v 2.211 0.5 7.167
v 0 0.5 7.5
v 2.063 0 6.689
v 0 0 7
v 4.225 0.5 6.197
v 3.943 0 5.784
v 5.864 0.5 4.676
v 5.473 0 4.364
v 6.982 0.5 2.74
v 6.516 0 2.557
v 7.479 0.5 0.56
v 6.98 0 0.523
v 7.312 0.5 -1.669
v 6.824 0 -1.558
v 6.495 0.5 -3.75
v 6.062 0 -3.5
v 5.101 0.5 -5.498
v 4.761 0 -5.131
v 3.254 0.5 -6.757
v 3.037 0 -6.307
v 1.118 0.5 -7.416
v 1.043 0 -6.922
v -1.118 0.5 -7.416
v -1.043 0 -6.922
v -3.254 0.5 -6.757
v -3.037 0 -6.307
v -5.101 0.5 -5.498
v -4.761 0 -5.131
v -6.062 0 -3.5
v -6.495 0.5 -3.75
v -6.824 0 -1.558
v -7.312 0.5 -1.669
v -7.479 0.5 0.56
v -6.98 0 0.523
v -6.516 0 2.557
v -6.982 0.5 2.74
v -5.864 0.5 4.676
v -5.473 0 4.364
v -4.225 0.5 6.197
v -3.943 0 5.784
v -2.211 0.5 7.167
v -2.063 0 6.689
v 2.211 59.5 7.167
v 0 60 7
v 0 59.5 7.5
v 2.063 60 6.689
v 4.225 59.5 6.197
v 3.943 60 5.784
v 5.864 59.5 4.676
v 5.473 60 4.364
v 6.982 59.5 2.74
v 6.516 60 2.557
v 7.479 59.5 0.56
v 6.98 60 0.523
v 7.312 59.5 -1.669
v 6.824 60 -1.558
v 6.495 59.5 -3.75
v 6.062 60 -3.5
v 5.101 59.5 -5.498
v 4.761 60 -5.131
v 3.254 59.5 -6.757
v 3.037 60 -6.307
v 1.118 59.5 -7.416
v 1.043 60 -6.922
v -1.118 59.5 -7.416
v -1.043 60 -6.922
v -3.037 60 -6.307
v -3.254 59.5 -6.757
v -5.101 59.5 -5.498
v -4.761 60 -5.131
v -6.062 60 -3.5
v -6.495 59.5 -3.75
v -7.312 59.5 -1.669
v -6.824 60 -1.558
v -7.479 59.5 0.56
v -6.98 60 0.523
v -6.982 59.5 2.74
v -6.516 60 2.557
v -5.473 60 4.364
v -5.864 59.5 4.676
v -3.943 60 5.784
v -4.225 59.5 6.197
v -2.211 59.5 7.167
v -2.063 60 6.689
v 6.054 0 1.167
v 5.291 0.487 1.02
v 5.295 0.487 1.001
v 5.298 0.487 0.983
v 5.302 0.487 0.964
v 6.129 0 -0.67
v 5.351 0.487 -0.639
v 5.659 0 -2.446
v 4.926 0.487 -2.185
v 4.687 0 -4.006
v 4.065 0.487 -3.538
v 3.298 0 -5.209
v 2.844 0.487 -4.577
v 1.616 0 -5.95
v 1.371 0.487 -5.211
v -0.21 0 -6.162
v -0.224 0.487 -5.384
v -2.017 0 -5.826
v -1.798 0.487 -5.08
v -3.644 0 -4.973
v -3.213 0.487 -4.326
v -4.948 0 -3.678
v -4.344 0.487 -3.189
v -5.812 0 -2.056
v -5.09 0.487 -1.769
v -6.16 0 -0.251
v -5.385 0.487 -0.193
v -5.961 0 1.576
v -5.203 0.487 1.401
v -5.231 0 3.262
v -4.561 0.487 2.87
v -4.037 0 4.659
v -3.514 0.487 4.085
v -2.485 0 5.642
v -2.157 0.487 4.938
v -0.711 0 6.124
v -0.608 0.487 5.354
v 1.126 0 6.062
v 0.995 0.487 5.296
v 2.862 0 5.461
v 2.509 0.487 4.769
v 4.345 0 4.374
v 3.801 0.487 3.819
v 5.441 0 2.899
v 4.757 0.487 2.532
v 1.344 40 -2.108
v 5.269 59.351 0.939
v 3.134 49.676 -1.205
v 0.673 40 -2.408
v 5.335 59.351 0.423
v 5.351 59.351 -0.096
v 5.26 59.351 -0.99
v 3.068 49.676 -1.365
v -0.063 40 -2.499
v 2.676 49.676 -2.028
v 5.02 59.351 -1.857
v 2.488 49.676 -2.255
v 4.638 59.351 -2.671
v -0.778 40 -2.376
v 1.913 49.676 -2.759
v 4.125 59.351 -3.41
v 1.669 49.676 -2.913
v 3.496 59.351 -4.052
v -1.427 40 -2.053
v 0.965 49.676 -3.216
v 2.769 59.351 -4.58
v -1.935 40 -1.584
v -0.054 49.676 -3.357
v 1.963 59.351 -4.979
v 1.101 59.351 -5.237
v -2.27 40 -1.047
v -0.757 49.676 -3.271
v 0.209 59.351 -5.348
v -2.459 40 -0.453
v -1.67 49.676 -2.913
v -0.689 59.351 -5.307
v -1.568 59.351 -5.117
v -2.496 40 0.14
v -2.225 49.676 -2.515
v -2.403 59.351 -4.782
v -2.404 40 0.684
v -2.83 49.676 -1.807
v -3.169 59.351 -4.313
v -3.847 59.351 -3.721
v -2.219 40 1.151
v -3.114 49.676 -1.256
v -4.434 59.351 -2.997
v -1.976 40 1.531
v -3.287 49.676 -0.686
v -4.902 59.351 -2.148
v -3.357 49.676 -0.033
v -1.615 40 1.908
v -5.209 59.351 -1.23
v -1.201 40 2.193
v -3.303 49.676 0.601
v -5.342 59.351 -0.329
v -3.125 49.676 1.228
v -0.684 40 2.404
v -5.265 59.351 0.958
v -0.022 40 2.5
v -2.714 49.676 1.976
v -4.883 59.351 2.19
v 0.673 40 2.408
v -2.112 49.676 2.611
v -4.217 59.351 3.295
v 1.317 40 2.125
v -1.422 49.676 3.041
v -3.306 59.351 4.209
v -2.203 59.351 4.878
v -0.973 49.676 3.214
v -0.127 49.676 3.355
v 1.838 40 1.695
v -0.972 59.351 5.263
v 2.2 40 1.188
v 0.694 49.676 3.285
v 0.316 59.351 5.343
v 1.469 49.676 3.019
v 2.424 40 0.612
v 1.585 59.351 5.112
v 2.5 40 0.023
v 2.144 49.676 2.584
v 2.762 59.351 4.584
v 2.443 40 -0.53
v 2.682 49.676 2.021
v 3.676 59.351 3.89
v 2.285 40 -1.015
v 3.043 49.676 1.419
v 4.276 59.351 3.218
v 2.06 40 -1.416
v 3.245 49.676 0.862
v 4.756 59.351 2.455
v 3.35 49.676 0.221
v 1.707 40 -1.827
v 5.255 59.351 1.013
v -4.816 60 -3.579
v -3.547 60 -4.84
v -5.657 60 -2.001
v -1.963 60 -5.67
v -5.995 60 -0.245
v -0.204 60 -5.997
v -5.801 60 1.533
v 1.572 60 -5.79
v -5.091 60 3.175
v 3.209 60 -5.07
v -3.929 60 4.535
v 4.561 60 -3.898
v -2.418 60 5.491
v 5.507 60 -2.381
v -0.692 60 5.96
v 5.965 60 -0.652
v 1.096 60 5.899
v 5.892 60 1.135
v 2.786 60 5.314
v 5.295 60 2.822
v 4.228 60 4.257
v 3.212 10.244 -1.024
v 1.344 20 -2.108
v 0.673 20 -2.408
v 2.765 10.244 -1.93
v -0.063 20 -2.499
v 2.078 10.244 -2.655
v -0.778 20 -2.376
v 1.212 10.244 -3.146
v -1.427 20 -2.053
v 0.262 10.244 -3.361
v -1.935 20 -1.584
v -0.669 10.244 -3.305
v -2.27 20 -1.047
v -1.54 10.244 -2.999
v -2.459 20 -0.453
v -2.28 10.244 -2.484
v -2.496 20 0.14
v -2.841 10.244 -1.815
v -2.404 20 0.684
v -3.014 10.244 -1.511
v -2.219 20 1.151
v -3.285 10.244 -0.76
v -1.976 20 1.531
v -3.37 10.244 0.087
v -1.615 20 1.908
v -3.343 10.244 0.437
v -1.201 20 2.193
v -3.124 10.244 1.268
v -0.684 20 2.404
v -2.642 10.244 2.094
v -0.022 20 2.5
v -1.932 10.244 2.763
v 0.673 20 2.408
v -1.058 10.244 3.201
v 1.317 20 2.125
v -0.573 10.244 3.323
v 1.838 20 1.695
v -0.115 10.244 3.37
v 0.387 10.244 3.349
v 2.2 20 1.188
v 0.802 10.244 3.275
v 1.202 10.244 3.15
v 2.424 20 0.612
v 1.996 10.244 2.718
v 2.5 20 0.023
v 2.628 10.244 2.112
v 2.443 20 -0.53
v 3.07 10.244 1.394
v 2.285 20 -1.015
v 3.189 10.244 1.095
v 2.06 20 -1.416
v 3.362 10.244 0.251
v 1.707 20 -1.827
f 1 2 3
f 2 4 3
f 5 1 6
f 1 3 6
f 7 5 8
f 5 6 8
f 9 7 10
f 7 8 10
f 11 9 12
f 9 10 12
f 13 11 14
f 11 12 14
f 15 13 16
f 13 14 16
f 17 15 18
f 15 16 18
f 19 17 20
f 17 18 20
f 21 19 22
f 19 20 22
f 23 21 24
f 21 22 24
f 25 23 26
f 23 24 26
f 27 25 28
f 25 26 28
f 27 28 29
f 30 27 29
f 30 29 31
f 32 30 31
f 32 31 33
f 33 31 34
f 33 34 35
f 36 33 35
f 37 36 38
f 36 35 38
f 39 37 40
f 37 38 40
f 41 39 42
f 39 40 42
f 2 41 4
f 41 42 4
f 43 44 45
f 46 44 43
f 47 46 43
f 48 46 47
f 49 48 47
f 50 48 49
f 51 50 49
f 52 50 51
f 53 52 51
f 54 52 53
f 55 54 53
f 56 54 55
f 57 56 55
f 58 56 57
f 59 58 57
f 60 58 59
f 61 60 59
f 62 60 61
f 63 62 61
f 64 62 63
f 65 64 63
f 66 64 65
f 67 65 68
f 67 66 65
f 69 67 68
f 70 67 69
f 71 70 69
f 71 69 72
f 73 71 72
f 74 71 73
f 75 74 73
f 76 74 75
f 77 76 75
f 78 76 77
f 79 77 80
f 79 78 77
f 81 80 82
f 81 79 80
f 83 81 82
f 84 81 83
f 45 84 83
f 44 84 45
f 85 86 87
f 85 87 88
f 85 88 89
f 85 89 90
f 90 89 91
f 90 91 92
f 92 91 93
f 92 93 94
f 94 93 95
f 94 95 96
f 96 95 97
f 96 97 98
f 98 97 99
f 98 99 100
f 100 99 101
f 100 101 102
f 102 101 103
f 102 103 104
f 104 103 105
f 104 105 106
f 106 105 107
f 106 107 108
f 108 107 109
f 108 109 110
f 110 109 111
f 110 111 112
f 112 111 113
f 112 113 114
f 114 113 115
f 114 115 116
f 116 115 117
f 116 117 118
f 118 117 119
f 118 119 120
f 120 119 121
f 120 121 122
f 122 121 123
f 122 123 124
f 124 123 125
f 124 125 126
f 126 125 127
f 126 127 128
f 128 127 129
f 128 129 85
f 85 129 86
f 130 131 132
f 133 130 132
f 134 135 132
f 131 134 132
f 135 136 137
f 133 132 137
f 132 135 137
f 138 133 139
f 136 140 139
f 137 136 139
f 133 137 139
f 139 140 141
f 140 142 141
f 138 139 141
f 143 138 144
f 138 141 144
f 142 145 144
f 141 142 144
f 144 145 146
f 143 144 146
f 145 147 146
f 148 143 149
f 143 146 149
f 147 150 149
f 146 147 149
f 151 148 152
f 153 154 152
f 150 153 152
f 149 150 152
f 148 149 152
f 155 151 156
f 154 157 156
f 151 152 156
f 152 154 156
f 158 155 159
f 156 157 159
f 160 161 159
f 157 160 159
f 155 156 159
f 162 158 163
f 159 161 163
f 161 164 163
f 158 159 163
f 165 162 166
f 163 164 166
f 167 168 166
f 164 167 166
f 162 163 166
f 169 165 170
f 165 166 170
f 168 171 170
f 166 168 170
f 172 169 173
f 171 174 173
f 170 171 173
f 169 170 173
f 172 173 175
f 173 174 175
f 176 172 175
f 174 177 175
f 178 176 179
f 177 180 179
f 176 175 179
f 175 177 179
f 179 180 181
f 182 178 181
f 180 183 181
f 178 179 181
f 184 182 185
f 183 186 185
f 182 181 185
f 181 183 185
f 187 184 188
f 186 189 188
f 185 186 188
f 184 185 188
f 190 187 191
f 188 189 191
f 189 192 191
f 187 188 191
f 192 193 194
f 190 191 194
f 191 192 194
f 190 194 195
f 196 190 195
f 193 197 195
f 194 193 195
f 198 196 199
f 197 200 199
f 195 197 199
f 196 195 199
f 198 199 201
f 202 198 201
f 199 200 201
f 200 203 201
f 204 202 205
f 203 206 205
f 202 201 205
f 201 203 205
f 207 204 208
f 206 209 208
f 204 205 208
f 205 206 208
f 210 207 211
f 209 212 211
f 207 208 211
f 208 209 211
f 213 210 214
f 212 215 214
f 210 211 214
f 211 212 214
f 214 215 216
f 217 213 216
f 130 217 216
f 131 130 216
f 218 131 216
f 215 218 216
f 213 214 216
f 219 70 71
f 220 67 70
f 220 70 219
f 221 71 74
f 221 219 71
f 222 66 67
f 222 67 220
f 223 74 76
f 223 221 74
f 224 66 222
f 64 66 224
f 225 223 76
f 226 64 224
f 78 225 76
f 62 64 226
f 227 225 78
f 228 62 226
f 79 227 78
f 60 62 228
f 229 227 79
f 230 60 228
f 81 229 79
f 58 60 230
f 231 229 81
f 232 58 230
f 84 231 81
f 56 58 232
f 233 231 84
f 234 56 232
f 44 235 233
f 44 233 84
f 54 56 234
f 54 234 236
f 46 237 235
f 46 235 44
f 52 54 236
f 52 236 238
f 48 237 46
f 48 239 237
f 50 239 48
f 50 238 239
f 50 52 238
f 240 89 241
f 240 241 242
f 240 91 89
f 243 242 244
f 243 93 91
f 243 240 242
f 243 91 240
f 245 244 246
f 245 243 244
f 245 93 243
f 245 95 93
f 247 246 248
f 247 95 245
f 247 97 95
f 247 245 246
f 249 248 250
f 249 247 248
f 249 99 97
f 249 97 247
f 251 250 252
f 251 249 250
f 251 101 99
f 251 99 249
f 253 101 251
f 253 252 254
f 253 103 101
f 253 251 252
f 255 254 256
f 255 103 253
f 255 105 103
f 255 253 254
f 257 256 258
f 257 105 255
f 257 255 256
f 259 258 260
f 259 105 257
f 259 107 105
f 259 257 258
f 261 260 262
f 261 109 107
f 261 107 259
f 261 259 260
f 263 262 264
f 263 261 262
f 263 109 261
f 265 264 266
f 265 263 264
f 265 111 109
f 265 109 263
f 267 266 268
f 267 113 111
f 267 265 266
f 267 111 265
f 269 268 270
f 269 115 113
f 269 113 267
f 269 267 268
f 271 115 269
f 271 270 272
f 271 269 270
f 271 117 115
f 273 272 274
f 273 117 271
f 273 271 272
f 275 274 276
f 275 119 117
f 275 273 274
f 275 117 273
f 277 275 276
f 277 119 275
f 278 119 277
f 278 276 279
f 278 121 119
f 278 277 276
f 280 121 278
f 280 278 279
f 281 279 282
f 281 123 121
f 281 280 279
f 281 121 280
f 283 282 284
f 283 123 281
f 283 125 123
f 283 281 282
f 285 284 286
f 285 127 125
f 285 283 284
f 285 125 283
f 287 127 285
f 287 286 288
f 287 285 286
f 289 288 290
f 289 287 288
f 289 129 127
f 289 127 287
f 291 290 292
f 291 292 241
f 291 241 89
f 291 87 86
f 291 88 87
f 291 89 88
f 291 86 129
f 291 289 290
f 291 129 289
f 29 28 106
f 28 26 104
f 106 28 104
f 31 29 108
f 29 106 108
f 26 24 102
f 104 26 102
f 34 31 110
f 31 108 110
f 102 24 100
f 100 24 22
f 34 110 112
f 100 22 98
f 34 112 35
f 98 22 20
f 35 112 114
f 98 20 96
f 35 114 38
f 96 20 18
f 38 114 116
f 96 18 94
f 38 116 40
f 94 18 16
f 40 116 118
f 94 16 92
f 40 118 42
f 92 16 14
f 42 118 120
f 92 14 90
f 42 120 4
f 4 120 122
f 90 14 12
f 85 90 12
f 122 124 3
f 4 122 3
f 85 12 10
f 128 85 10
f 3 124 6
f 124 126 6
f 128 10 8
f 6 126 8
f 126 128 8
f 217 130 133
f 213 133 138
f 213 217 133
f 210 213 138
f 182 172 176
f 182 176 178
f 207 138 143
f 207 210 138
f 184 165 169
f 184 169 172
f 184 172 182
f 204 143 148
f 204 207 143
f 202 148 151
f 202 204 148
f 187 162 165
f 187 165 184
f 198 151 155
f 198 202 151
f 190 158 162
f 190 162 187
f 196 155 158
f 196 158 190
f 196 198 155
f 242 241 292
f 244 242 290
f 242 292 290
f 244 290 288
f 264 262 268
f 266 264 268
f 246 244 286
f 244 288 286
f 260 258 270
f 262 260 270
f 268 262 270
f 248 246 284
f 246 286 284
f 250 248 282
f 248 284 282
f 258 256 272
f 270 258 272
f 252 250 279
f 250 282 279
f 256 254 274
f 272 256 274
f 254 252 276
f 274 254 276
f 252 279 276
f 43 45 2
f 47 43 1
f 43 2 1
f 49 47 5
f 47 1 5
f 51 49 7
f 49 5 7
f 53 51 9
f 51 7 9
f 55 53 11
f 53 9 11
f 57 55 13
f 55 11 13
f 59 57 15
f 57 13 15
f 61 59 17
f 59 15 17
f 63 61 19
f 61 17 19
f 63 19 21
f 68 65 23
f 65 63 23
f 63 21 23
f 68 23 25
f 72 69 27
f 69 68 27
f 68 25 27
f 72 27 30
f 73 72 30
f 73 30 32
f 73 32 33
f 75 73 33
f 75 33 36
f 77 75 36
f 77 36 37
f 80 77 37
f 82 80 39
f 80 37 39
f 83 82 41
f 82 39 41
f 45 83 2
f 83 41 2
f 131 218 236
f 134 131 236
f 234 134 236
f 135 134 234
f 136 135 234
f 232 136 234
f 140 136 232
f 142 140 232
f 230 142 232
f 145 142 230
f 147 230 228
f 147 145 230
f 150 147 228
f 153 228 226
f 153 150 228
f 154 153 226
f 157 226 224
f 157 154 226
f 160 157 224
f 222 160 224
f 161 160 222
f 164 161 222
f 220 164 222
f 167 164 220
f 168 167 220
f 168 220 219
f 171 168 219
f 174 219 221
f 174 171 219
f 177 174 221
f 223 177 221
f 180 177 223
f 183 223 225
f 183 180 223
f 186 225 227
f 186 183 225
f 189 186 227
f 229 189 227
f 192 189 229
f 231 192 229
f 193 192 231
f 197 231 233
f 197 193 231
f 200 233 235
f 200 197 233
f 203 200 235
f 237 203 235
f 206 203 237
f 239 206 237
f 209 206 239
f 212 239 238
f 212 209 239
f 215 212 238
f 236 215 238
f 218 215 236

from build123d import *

# Parameters (mm, degrees)
CROQUIS1_R              = 7.5
SALIENTE_EXTRUIR1_DEPTH = 60
CHAFL_N2_SIZE           = 0.5
CHAFL_N2_SIZE_2         = 0.665279689


with BuildPart() as part:
    # Croquis1 → Saliente-Extruir1 (new body)
    with BuildSketch(Plane(origin=(0, 0, 0), x_dir=(1, 0, 0), z_dir=(0, 1, 0))):
        with Locations(Location((0, 0, 0), (0, 0, 270))):
            Circle(CROQUIS1_R)
    extrude(amount=SALIENTE_EXTRUIR1_DEPTH)

    # Cortar-Recubrir2: read off the stored shape, not the designer's step
    # Cortar-Recubrir2: loft between two sections, ruled curve by curve
    cortar_recubrir2_from = [
        Edge.make_bspline([(1.343543407, 40, -2.108291041), (-2.873038675, 40, -4.795377855), (-5.560125489, 40, -0.578795773), (-1.343543407, 40, 2.108291041), (2.873038675, 40, 4.795377855), (5.560125489, 40, 0.578795773), (1.343543407, 40, -2.108291041)], [0, 0, 0, 0, 0.5, 0.5, 0.5, 1, 1, 1, 1], 3, [1, 0.333333333, 0.333333333, 1, 0.333333333, 0.333333333, 1]),
    ]
    cortar_recubrir2_to = [
        Edge.make_bspline([(5.400627652, 60, 1.040779016), (7.482185685, 60, -9.760476288), (-3.319069619, 60, -11.842034321), (-5.400627652, 60, -1.040779016), (-7.482185685, 60, 9.760476288), (3.319069619, 60, 11.842034321), (5.400627652, 60, 1.040779016)], [0, 0, 0, 0, 0.5, 0.5, 0.5, 1, 1, 1, 1], 3, [1, 0.333333333, 0.333333333, 1, 0.333333333, 0.333333333, 1]),
    ]
    cortar_recubrir2 = Solid(Shell([*[Face.make_surface_from_curves(cortar_recubrir2_from[k], cortar_recubrir2_to[k]) for k in range(1)], Face(Wire(cortar_recubrir2_from)), Face(Wire(cortar_recubrir2_to))]))
    add(cortar_recubrir2, mode=Mode.SUBTRACT)

    # Chaflán1
    # the kernel refuses this chamfer: 0.665279689, 0.5 mm, written as the material it takes off along each edge
    with BuildSketch(Plane(origin=(0, 60, 0), x_dir=(0, 0, 1), z_dir=(-1, 0, 0))) as chafl_n1_piece_1:
        with BuildLine():
            Line((7.514142136, -0.514142136), (6.985857864, 0.014142136))
            Line((6.985857864, 0.014142136), (6.985857864, 0.024142136))
            ThreePointArc((6.985857864, 0.024142136), (7.242928932, 0.01), (7.5, 0.01))
            Line((7.5, 0.01), (7.51, 0))
            ThreePointArc((7.51, 0), (7.51, -0.257071068), (7.524142136, -0.514142136))
            Line((7.524142136, -0.514142136), (7.514142136, -0.514142136))
        make_face()
    revolve(axis=Axis((0, 60, 0), (0, 1, 0)), mode=Mode.SUBTRACT)
    with BuildSketch(Plane(origin=(0, 60, 0), x_dir=(0.9819323004404472, 1.2918958832590882e-15, 0.18923254834127032), z_dir=(-0.18923254834127032, 0, 0.9819323004404472))) as chafl_n1_piece_2:
        with BuildLine():
            Line((6.018807954, 0.018825944), (5.333201213, -0.667436596))
            Line((5.333201213, -0.667436596), (5.320226638, -0.664487154))
            ThreePointArc((5.320226638, -0.664487154), (5.410397761, -0.332303159), (5.487030093, 0.002969907))
            Line((5.487030093, 0.002969907), (5.5, 0.013305594))
            ThreePointArc((5.5, 0.013305594), (5.759403977, 0.013305594), (6.018807954, 0.032131538))
            Line((6.018807954, 0.032131538), (6.018807954, 0.018825944))
        make_face()
    revolve(axis=Axis((0, 60, 0), (0, 1, 0)), mode=Mode.SUBTRACT)

    # Simetría7: Cortar-Recubrir2 across plane
    add(cortar_recubrir2.mirror(Plane(origin=(0, 30, 0), x_dir=(0, 0, 1), z_dir=(0, -1, 0))), mode=Mode.SUBTRACT)

    # Chaflán2
    # the kernel refuses this chamfer: 0.665279689, 0.5 mm, written as the material it takes off along each edge
    with BuildSketch(Plane(origin=(0, 0, 0), x_dir=(0, 0, 1), z_dir=(-1, 0, 0))) as chafl_n2_piece_1:
        Polygon((7.5, CHAFL_N2_SIZE), (7.5 - CHAFL_N2_SIZE, 0), (7.5, 0), align=None)
    revolve(axis=Axis((0, 0, 0), (0, 1, 0)), mode=Mode.SUBTRACT)
    with BuildSketch(Plane(origin=(0, 0, 0), x_dir=(0.9819323004404472, 0, 0.18923254834127032), z_dir=(-0.18923254834127032, 0, 0.9819323004404472))) as chafl_n2_piece_2:
        with BuildLine():
            Line((5.5 + CHAFL_N2_SIZE_2, 0), (5.5 - CHAFL_N2_SIZE * 0.22264139859, CHAFL_N2_SIZE * 0.974900409085))
            ThreePointArc((5.5 - CHAFL_N2_SIZE * 0.22264139859, CHAFL_N2_SIZE * 0.974900409085), (5.442174309, 0.252877674), (5.5, 0))
            Line((5.5, 0), (5.5 + CHAFL_N2_SIZE_2, 0))
        make_face()
    revolve(axis=Axis((0, 0, 0), (0, 1, 0)), mode=Mode.SUBTRACT)


solid = part.part
